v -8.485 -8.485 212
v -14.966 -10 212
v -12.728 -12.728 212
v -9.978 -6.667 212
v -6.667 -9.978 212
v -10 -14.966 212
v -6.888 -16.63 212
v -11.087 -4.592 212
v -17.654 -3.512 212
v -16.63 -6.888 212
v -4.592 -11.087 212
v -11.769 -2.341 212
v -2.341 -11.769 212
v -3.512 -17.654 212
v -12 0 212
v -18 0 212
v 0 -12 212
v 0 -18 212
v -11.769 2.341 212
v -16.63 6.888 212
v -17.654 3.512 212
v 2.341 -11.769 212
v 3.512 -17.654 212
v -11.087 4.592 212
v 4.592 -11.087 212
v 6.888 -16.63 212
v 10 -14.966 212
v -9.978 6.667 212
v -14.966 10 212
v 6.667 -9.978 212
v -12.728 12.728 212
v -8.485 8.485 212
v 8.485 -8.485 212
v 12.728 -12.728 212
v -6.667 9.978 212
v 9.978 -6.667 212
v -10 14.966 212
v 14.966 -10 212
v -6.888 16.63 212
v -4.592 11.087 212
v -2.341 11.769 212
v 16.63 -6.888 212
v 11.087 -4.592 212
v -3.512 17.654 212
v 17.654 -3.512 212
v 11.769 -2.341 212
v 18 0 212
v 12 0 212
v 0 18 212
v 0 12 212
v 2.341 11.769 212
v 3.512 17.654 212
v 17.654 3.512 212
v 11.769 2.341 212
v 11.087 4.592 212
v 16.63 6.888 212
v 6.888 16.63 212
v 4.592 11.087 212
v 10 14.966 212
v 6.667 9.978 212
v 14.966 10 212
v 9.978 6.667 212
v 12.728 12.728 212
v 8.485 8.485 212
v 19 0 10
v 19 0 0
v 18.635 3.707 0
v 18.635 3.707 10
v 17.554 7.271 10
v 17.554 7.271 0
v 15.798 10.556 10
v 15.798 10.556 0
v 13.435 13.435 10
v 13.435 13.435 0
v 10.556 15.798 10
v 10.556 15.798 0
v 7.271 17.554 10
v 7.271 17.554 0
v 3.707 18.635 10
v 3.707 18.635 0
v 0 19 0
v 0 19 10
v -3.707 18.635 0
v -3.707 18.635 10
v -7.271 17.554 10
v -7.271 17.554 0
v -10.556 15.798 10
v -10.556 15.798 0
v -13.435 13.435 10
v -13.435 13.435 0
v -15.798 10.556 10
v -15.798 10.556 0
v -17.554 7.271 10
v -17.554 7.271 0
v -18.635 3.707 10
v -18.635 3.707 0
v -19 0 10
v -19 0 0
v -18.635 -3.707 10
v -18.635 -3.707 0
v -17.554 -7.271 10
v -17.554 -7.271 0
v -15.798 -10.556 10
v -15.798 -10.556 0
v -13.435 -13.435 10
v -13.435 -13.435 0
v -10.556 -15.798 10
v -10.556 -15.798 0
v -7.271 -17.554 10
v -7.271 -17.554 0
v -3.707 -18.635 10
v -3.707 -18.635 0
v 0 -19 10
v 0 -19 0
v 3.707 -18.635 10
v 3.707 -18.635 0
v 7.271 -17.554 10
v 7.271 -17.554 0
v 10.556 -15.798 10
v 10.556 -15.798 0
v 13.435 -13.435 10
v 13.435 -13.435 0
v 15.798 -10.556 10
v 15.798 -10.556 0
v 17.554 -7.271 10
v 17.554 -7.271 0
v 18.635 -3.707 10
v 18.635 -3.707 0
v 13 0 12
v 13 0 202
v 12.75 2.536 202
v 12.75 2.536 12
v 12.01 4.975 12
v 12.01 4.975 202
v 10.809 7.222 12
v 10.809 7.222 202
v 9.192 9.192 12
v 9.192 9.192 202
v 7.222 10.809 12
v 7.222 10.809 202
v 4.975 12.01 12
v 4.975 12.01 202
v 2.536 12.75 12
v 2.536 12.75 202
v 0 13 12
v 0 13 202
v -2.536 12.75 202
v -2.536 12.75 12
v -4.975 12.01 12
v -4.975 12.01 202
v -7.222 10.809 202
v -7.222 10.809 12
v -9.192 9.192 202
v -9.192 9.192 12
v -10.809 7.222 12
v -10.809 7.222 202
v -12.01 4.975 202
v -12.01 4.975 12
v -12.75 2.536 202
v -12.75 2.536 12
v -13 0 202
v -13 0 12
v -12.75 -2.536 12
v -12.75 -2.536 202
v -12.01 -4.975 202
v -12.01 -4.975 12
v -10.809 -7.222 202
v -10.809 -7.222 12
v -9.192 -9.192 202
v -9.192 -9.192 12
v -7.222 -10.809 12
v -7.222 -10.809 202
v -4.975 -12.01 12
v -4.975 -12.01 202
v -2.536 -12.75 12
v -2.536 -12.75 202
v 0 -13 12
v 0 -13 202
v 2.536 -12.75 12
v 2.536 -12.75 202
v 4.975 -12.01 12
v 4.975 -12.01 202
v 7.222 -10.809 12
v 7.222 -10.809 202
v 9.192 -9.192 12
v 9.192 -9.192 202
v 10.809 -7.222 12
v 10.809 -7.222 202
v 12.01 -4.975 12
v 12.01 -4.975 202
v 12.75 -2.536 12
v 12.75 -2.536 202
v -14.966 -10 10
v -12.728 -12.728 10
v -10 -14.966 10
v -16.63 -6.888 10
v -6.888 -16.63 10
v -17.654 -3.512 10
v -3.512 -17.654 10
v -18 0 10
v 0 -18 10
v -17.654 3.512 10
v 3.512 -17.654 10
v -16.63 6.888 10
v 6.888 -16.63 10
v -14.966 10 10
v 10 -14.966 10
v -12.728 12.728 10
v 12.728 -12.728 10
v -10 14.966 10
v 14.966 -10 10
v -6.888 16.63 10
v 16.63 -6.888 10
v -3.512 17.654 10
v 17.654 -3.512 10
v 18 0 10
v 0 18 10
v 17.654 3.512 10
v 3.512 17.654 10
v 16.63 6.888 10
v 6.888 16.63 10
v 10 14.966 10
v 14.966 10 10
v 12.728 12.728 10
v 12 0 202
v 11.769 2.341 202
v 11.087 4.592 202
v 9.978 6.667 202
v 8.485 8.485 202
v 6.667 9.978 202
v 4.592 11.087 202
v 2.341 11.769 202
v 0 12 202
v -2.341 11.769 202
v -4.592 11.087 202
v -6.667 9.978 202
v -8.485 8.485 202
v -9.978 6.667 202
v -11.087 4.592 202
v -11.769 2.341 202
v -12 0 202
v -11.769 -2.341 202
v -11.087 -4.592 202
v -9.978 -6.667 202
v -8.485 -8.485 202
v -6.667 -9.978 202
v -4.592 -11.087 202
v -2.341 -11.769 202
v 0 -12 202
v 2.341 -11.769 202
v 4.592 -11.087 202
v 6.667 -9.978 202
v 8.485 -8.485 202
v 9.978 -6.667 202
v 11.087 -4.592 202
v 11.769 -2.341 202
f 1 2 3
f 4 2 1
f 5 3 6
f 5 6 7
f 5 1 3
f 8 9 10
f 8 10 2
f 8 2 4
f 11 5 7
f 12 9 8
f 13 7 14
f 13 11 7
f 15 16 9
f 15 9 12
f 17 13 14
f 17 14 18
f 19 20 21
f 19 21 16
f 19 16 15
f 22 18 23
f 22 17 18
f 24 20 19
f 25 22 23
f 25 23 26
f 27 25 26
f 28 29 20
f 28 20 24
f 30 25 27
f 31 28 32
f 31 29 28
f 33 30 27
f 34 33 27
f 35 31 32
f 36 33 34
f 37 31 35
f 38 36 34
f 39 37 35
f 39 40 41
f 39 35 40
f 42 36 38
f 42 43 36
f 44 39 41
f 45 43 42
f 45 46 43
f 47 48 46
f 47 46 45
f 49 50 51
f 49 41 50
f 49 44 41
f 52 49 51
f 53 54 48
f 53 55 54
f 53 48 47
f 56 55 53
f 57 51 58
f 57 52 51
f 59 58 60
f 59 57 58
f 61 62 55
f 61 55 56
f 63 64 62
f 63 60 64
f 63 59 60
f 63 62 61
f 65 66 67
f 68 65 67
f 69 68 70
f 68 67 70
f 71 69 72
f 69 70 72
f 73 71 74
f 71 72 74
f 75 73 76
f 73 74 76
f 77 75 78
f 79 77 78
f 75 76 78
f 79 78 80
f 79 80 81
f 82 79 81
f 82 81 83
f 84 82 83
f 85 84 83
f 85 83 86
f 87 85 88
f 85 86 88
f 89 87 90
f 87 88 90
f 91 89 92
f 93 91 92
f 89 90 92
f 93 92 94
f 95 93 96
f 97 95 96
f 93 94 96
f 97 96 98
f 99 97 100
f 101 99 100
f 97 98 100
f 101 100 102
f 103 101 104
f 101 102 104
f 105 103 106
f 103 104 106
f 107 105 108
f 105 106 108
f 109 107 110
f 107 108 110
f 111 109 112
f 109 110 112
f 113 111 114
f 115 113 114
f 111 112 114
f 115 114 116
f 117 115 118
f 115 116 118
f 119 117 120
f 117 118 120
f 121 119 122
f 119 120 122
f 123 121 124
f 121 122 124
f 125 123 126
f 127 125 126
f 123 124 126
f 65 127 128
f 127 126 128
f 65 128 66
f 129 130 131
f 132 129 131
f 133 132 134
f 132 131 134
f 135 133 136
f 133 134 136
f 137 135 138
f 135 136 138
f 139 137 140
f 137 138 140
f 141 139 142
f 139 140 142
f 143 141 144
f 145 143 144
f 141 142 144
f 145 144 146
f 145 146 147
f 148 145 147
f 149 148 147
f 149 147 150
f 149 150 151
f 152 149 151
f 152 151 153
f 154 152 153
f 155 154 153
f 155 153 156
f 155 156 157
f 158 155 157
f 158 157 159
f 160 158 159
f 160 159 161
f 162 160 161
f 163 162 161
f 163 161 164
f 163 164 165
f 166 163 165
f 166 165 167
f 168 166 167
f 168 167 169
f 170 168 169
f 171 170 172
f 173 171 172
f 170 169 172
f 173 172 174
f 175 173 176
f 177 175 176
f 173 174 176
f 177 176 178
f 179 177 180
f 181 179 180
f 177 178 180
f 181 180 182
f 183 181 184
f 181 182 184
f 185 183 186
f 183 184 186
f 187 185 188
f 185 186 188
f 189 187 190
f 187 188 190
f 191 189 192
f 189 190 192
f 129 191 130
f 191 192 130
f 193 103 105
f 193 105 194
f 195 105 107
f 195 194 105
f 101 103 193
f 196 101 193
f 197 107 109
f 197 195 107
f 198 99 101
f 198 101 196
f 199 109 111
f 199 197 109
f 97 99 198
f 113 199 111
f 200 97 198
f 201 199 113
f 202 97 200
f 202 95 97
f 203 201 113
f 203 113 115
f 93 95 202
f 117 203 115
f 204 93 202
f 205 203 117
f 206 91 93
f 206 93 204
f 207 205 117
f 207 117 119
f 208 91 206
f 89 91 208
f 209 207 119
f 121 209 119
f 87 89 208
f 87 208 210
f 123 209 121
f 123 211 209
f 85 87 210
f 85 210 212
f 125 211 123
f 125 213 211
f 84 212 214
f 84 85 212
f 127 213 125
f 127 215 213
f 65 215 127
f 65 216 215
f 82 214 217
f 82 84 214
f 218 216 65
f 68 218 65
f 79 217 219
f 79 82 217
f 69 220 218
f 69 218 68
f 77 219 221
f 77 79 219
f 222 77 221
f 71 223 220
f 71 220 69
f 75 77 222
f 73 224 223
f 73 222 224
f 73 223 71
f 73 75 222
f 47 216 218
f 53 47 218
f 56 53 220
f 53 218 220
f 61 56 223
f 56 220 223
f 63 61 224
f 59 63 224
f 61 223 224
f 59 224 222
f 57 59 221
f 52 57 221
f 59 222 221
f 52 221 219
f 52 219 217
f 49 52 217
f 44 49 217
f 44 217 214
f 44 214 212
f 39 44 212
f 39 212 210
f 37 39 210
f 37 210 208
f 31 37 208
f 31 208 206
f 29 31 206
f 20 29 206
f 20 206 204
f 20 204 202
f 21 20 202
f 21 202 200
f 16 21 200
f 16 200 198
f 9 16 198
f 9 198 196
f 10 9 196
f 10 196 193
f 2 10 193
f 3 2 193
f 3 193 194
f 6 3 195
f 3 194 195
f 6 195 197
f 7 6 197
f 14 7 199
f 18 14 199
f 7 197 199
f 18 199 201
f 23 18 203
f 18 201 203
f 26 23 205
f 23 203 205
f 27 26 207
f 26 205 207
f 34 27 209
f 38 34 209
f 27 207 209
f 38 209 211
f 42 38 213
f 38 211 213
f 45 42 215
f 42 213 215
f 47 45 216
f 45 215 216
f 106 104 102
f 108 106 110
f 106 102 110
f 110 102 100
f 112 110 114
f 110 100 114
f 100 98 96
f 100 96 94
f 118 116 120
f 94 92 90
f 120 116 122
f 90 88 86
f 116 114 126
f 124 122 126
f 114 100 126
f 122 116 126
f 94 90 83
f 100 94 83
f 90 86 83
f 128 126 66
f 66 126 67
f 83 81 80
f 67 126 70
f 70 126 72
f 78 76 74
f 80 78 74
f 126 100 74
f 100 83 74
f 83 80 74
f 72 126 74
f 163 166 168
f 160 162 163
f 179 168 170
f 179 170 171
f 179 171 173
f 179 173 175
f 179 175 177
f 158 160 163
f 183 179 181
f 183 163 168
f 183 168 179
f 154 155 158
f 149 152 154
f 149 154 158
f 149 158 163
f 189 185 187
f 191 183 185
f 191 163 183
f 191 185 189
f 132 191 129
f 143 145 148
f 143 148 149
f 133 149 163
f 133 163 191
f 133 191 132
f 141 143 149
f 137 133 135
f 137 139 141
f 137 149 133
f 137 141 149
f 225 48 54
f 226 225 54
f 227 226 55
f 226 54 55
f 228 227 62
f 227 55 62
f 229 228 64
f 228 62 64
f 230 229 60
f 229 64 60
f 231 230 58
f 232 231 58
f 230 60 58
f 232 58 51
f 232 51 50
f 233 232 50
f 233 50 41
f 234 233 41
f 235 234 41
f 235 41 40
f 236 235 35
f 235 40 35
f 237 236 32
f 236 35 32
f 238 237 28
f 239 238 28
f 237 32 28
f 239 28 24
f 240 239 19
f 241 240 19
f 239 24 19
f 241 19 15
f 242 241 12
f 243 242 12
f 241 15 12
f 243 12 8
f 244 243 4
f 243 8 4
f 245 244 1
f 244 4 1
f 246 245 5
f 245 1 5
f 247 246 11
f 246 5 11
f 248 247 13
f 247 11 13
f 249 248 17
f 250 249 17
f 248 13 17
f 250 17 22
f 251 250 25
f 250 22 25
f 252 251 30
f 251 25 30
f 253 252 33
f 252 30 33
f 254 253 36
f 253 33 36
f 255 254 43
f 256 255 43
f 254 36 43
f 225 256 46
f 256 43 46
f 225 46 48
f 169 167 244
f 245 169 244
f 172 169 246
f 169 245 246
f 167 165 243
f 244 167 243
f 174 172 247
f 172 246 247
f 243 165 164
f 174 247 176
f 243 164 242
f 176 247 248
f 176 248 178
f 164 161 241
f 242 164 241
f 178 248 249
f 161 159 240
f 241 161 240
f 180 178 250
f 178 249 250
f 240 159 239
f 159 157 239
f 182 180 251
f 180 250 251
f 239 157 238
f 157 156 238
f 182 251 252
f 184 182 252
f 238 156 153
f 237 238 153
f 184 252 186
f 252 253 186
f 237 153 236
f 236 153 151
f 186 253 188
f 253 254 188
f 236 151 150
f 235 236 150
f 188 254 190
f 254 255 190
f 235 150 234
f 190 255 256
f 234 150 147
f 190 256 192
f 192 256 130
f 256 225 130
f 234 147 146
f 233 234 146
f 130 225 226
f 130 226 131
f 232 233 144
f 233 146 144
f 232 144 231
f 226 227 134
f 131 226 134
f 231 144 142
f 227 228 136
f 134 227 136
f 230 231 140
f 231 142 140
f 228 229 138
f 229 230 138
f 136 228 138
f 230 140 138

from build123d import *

# Parameters (mm, degrees)
SKETCH1_R           = 19
BOSS_EXTRUDE1_DEPTH = 10
SKETCH1_3_R         = 18
BOSS_EXTRUDE2_DEPTH = 212
SKETCH2_R           = 13
CUT_EXTRUDE1_DEPTH  = 200
SKETCH3_R           = 13
SKETCH3_R_2         = 12
BOSS_EXTRUDE3_DEPTH = 10


with BuildPart() as part:
    # Sketch1 → Boss-Extrude1 (new body)
    with BuildSketch(Plane.XY):
        Circle(SKETCH1_R)
    extrude(amount=BOSS_EXTRUDE1_DEPTH)

    # Sketch1<3> → Boss-Extrude2 (add)
    with BuildSketch(Plane.XY):
        Circle(SKETCH1_3_R)
    extrude(amount=BOSS_EXTRUDE2_DEPTH)

    # Sketch2 → Cut-Extrude1 (cut)
    with BuildSketch(Plane.XY.offset(212)):
        Circle(SKETCH2_R)
    extrude(amount=-CUT_EXTRUDE1_DEPTH, mode=Mode.SUBTRACT)

    # Sketch3 → Boss-Extrude3 (add)
    with BuildSketch(Plane.XY.offset(212)):
        Circle(SKETCH3_R)
        Circle(SKETCH3_R_2, mode=Mode.SUBTRACT)
    extrude(amount=-BOSS_EXTRUDE3_DEPTH)


solid = part.part
